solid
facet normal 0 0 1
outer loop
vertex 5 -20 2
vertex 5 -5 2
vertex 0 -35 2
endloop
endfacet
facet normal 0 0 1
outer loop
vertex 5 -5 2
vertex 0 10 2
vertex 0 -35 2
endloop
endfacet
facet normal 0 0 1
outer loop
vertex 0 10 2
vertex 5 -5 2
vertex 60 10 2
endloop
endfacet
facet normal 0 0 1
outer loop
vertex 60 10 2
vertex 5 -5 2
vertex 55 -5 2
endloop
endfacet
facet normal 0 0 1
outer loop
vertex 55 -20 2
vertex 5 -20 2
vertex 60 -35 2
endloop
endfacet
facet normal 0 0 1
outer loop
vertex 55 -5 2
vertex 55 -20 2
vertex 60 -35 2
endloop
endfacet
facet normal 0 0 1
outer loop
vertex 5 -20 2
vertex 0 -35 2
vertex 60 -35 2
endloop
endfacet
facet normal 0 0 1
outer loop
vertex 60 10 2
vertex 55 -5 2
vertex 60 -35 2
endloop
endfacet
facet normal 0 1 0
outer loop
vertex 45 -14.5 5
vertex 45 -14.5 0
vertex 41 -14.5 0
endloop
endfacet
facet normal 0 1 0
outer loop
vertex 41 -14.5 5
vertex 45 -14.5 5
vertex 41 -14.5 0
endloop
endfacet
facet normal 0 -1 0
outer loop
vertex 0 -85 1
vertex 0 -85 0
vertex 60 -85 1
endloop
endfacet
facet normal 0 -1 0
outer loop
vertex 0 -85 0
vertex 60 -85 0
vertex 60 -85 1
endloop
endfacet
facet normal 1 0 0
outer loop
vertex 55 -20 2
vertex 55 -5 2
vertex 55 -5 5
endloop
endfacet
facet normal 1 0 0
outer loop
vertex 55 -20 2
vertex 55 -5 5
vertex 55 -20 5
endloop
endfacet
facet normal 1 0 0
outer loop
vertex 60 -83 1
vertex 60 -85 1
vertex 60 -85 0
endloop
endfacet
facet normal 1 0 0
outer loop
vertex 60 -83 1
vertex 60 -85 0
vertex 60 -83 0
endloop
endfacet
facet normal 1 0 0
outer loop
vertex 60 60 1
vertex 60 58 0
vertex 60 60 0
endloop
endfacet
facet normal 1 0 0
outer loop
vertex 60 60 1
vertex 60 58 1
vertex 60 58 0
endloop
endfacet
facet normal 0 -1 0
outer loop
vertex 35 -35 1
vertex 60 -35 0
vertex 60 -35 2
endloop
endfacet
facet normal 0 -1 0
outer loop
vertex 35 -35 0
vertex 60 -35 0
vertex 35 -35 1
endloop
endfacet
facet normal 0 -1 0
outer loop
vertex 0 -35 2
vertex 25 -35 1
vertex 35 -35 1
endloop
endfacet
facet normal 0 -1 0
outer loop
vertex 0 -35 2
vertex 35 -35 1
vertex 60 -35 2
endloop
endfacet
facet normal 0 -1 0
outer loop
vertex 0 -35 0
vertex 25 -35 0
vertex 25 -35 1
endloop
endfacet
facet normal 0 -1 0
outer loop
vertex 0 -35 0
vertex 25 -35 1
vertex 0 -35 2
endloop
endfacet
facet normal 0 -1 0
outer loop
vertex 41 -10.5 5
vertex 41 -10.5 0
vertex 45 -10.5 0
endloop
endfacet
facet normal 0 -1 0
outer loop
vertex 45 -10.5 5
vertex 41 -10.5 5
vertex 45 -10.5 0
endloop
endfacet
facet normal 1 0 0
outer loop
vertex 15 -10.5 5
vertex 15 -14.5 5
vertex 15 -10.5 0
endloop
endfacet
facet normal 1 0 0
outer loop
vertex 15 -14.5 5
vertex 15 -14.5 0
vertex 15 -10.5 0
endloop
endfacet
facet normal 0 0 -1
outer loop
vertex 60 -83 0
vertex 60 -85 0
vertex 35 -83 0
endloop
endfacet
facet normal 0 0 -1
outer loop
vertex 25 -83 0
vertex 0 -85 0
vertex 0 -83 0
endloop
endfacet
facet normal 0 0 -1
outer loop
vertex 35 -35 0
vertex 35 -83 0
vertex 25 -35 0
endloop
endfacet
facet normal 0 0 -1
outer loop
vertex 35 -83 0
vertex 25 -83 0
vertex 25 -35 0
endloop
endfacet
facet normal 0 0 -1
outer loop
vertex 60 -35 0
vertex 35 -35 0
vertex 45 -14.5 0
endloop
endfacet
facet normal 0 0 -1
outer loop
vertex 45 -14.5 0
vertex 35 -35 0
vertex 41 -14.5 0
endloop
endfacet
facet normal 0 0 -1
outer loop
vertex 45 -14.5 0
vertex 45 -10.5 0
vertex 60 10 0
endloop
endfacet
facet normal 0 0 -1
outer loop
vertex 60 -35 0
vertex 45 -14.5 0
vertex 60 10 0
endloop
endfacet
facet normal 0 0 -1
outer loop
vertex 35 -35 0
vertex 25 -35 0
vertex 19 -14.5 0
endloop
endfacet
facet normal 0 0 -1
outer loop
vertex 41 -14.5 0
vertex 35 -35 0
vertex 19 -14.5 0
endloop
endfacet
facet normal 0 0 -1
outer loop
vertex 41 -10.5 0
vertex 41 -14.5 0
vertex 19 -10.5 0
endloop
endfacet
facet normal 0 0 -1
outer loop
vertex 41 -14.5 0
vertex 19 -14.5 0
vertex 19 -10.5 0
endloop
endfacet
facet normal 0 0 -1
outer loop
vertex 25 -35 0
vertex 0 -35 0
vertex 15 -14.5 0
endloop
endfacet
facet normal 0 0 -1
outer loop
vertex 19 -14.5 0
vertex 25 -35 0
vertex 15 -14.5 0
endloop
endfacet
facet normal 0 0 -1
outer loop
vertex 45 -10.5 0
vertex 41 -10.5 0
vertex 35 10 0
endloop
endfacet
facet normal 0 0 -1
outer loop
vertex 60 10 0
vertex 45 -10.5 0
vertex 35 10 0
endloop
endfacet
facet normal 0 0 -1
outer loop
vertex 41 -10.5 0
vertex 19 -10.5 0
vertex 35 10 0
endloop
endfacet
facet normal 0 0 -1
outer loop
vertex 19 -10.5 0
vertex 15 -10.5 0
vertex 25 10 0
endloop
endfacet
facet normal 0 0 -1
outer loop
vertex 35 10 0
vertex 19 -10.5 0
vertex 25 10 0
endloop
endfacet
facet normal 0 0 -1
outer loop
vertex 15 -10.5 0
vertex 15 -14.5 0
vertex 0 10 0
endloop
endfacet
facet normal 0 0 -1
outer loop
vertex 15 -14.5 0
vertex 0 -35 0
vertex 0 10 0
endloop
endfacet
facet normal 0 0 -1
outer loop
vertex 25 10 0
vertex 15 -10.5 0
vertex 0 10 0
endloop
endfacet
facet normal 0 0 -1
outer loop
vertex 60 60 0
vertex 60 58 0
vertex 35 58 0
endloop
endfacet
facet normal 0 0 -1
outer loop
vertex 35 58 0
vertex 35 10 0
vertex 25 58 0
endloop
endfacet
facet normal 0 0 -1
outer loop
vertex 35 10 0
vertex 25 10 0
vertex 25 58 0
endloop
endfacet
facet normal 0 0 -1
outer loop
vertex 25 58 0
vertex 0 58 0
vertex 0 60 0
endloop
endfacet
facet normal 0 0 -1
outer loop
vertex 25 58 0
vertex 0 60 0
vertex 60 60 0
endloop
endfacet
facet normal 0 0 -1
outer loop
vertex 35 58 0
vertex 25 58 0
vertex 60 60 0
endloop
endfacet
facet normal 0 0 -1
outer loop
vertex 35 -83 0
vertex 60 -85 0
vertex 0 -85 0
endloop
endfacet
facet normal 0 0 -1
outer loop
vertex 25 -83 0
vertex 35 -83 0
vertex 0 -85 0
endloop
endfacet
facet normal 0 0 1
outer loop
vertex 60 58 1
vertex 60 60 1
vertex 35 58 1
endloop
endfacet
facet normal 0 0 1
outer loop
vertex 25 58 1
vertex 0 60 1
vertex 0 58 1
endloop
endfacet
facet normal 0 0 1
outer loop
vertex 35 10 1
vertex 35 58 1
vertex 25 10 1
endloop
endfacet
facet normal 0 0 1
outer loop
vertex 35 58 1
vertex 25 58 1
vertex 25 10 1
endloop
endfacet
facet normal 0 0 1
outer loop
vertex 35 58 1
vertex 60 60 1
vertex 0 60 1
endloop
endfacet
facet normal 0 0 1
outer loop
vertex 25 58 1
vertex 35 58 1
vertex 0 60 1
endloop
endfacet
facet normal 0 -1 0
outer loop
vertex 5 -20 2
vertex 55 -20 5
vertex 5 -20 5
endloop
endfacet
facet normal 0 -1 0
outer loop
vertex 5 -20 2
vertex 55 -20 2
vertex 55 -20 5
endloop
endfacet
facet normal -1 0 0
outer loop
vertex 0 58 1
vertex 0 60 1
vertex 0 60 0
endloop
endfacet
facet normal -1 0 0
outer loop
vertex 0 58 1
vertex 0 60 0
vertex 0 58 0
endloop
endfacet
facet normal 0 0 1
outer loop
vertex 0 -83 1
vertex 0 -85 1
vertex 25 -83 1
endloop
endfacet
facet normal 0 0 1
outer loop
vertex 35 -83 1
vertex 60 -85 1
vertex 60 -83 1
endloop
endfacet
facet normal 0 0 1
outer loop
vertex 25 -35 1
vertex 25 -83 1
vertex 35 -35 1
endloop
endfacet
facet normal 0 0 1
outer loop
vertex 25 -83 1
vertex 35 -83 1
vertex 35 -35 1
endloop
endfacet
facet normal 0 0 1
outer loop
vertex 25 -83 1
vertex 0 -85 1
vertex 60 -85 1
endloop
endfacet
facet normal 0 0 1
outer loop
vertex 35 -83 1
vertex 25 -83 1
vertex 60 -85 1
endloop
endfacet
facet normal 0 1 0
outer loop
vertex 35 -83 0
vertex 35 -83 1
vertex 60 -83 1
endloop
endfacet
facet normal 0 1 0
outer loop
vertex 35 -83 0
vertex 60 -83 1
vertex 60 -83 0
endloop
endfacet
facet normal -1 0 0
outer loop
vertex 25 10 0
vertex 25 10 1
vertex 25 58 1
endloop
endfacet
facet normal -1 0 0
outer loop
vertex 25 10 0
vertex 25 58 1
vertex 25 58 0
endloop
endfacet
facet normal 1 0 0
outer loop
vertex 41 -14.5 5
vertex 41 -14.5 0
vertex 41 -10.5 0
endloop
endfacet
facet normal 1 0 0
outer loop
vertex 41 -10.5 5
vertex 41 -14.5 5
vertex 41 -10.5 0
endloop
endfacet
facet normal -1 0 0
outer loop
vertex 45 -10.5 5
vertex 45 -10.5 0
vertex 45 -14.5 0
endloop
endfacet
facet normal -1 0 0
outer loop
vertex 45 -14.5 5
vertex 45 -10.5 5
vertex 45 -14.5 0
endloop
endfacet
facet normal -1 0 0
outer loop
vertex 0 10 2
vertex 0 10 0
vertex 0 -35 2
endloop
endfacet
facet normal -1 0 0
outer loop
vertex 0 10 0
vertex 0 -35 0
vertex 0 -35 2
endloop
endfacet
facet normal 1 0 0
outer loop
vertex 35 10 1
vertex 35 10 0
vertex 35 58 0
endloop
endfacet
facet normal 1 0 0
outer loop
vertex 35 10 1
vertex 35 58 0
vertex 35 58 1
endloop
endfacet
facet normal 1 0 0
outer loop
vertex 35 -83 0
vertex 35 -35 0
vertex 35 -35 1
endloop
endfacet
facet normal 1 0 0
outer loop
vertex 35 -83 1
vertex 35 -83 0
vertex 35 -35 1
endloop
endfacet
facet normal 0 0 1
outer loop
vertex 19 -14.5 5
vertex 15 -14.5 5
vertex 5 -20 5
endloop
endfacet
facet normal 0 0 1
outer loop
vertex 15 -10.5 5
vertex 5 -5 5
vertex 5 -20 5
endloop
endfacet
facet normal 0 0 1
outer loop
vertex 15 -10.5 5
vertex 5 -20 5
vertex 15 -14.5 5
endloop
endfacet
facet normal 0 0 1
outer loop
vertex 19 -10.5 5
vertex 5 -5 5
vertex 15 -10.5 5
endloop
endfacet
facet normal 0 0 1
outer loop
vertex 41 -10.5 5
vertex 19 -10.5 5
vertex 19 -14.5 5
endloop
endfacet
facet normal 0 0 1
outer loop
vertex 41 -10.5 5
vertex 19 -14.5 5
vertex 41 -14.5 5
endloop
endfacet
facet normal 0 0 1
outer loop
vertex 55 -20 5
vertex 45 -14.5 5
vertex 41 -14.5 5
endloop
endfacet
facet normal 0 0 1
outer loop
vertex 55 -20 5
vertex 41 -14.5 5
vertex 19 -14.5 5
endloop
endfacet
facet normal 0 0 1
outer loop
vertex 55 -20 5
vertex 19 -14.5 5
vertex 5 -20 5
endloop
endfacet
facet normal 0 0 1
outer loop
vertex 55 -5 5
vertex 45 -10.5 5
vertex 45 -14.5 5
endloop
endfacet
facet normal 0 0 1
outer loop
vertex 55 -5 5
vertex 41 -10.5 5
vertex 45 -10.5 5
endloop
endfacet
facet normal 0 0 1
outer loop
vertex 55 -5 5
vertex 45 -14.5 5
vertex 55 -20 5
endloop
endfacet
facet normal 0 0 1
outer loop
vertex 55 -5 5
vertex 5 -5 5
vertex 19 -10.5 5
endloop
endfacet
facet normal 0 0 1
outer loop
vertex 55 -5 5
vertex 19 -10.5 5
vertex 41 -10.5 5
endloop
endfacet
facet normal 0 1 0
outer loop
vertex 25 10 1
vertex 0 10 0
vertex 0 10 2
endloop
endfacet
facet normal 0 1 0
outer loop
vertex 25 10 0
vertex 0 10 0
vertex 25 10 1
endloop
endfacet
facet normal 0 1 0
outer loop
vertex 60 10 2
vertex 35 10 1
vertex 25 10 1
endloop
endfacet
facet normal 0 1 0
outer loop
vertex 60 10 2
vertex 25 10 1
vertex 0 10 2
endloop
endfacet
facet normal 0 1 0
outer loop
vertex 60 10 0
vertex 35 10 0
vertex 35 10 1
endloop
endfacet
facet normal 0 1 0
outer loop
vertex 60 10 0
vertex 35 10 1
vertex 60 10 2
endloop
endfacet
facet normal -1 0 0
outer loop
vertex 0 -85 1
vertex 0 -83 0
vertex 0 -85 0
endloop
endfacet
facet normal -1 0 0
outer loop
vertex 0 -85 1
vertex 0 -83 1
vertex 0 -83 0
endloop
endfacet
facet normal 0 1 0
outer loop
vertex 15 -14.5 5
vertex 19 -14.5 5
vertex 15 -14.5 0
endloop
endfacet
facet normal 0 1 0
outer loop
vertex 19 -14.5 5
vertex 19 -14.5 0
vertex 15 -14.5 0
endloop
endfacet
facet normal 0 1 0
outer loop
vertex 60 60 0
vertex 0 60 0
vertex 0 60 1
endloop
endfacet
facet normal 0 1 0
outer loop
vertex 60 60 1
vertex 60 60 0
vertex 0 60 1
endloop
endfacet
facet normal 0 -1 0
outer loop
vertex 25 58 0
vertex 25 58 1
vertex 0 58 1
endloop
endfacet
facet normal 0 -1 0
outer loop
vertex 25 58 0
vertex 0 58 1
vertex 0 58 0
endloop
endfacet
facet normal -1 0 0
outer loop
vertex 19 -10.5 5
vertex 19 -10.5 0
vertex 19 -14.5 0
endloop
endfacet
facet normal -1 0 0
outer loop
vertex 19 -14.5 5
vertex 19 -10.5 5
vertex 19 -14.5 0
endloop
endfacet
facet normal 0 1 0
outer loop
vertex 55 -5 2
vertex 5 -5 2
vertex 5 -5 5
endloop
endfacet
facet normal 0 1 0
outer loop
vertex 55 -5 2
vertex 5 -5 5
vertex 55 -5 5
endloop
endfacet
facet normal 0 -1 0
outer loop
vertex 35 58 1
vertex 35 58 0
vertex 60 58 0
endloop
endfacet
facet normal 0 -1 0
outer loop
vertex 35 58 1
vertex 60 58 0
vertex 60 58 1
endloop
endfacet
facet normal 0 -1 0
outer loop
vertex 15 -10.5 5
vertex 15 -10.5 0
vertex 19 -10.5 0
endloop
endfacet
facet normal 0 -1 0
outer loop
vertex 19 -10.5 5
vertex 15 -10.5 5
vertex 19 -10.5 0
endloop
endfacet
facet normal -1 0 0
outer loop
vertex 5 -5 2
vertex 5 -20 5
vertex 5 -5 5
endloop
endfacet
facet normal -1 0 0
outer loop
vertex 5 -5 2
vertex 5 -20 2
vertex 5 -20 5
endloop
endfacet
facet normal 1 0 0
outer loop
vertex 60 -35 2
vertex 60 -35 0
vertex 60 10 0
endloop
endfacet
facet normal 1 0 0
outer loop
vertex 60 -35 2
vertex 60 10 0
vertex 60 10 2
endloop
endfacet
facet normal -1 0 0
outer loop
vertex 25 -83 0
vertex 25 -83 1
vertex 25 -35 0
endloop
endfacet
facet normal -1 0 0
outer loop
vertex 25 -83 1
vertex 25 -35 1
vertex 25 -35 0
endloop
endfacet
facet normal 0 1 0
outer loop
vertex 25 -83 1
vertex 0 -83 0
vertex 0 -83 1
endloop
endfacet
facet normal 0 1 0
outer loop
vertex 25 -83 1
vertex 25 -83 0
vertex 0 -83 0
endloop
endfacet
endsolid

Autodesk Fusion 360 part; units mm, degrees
sketch "Sketch1" plane through (0, 0, 0) normal (0, 0, 1) x (1, 0, 0)
  line L0 (0, 0) -> (60, 0)
  line L1 (60, 0) -> (60, -25)
  line L2 (60, -25) -> (0, -25)
  line L3 (0, -25) -> (0, 0)
  line L4 (5, -5) -> (55, -5)
  line L5 (55, -5) -> (55, -20)
  line L6 (55, -20) -> (5, -20)
  line L7 (5, -20) -> (5, -5)
  line L8 (41, -10.5) -> (45, -10.5)
  line L9 (45, -10.5) -> (45, -14.5)
  line L10 (45, -14.5) -> (41, -14.5)
  line L11 (41, -14.5) -> (41, -10.5)
  line L12 (15, -10.5) -> (19, -10.5)
  line L13 (19, -10.5) -> (19, -14.5)
  line L14 (19, -14.5) -> (15, -14.5)
  line L15 (15, -14.5) -> (15, -10.5)
  dimension "d1" = 60
  dimension "d2" = 25
  dimension "d3" = 50
  dimension "d4" = 15
  dimension "d5" = 5
  dimension "d6" = 5
  dimension "d7" = 4
  dimension "d8" = 10
  dimension "d9" = 5.5
  dimension "d10" = 4
  dimension "d11" = 4
  dimension "d12" = 5.5
  dimension "d13" = 10
  dimension "d14" = 4
extrude "Extrude1" add sketch "Sketch1" along normal blind 2 contours L0 L1 L2 L3
sketch "Sketch2" plane through (0, 0, 0) normal (0, 0, 1) x (1, 0, 0)
  line L0 (15, -10.5) -> (19, -10.5)
  line L1 (19, -10.5) -> (19, -14.5)
  line L2 (19, -14.5) -> (15, -14.5)
  line L3 (15, -14.5) -> (15, -10.5)
  line L4 (41, -10.5) -> (45, -10.5)
  line L5 (45, -10.5) -> (45, -14.5)
  line L6 (45, -14.5) -> (41, -14.5)
  line L7 (41, -14.5) -> (41, -10.5)
  line L8 (55, -5) -> (55, -20)
  line L9 (55, -20) -> (5, -20)
  line L10 (5, -20) -> (5, -5)
  line L11 (5, -5) -> (55, -5)
  dimension "d17" = 4
  dimension "d18" = 10
  dimension "d19" = 5.5
  dimension "d20" = 4
  dimension "d21" = 4
  dimension "d22" = 10
  dimension "d23" = 5.5
  dimension "d24" = 4
extrude "Extrude2" add sketch "Sketch2" along normal blind 5
extrude "Extrude3" add 1 faces at (40, -25, 0.6667) along direction (0, -1, 0) blind 10
extrude "Extrude4" add 1 faces at (20, 0, 0.6667) along direction (0, 1, 0) blind 10
sketch "Sketch3" plane through (0, -35, 0) normal (0, -1, 0) x (1, 0, 0)
  line L0 (0, 0) -> (60, 0)
  line L1 (60, 0) -> (60, 2)
  line L2 (60, 2) -> (0, 2)
  line L3 (0, 2) -> (0, 0)
  line L4 (25, 0) -> (35, 0)
  line L5 (35, 0) -> (35, 1)
  line L6 (35, 1) -> (25, 1)
  line L7 (25, 1) -> (25, 0)
  line L8 (41, 0) -> (41, 5)
  dimension "d31" = 1
  dimension "d32" = 6
  dimension "d33" = 10
extrude "Extrude5" add sketch "Sketch3" along normal blind 50 contours L0 L4 L5 L6 L7
sketch "Sketch4" plane through (0, 10, 0) normal (0, 1, 0) x (-1, 0, 0)
  line L0 (-60, 0) -> (0, 0)
  line L1 (0, 0) -> (0, 2)
  line L2 (0, 2) -> (-60, 2)
  line L3 (-60, 2) -> (-60, 0)
  line L4 (-35, 1) -> (-25, 1)
  line L5 (-25, 1) -> (-25, 0)
  line L6 (-25, 0) -> (-35, 0)
  line L7 (-35, 0) -> (-35, 1)
  line L8 (-19, 0) -> (-19, 5)
  line L9 (-41, 0) -> (-41, 5)
  dimension "d36" = 6
  dimension "d37" = 1
  dimension "d38" = 6
extrude "Extrude6" add sketch "Sketch4" along normal blind 50 contours L0 L4 L5 L6 L7
sketch "Sketch5" plane through (35, 0, 0) normal (1, 0, 0) x (0, 1, 0)
  line L0 (-35, 0) -> (-35, 1)
  line L1 (-35, 1) -> (-85, 1)
  line L2 (-85, 1) -> (-85, 0)
  line L3 (-85, 0) -> (-35, 0)
  line L4 (-85, 1) -> (-83, 1)
  line L5 (-83, 1) -> (-83, 0)
  line L6 (-83, 0) -> (-85, 0)
  line L7 (-85, 0) -> (-85, 1)
  dimension "d41" = 2
extrude "Extrude7" add sketch "Sketch5" along normal blind 25 contours L1 L2 L3 L4 L5 L6 L7
sketch "Sketch6" plane through (25, 0, 0) normal (-1, 0, 0) x (0, -1, 0)
  line L0 (35, 1) -> (35, 0)
  line L1 (35, 0) -> (85, 0)
  line L2 (85, 0) -> (85, 1)
  line L3 (85, 1) -> (35, 1)
  line L4 (85, 0) -> (83, 0)
  line L5 (83, 0) -> (83, 1)
  line L6 (83, 1) -> (85, 1)
  line L7 (85, 1) -> (85, 0)
  dimension "d44" = 2
extrude "Extrude8" add sketch "Sketch6" along normal blind 25 contours L1 L2 L3 L4 L5 L6 L7
sketch "Sketch7" plane through (25, 0, 0) normal (-1, 0, 0) x (0, -1, 0)
  line L0 (-10, 0) -> (-10, 1)
  line L1 (-10, 1) -> (-60, 1)
  line L2 (-60, 1) -> (-60, 0)
  line L3 (-60, 0) -> (-10, 0)
  line L4 (-60, 1) -> (-58, 1)
  line L5 (-58, 1) -> (-58, 0)
  line L6 (-58, 0) -> (-60, 0)
  line L7 (-60, 0) -> (-60, 1)
  dimension "d47" = 2
extrude "Extrude9" add sketch "Sketch7" along normal blind 25 contours L1 L2 L3 L4 L5 L6 L7
sketch "Sketch8" plane through (35, 0, 0) normal (1, 0, 0) x (0, 1, 0)
  line L0 (10, 1) -> (10, 0)
  line L1 (10, 0) -> (60, 0)
  line L2 (60, 0) -> (60, 1)
  line L3 (60, 1) -> (10, 1)
  line L4 (58, 1) -> (60, 1)
  line L5 (60, 1) -> (60, 0)
  line L6 (60, 0) -> (58, 0)
  line L7 (58, 0) -> (58, 1)
  dimension "d50" = 2
extrude "Extrude10" add sketch "Sketch8" along normal blind 25 contours L1 L2 L3 L4 L5 L6 L7
sketch "Sketch9" plane through (0, 0, 5) normal (0, 0, 1) x (-1, 0, 0)
  line L0 (-19, 14.5) -> (-15, 14.5)
  line L1 (-15, 14.5) -> (-15, 10.5)
  line L2 (-15, 10.5) -> (-19, 10.5)
  line L3 (-45, 14.5) -> (-41, 14.5)
  line L4 (-41, 14.5) -> (-41, 10.5)
  line L5 (-41, 10.5) -> (-45, 10.5)
  line L6 (-45, 10.5) -> (-45, 14.5)
  line L7 (-5, 5) -> (-5, 20)
  line L8 (-5, 20) -> (-55, 20)
  line L9 (-55, 20) -> (-55, 5)
  line L10 (-55, 5) -> (-5, 5)
